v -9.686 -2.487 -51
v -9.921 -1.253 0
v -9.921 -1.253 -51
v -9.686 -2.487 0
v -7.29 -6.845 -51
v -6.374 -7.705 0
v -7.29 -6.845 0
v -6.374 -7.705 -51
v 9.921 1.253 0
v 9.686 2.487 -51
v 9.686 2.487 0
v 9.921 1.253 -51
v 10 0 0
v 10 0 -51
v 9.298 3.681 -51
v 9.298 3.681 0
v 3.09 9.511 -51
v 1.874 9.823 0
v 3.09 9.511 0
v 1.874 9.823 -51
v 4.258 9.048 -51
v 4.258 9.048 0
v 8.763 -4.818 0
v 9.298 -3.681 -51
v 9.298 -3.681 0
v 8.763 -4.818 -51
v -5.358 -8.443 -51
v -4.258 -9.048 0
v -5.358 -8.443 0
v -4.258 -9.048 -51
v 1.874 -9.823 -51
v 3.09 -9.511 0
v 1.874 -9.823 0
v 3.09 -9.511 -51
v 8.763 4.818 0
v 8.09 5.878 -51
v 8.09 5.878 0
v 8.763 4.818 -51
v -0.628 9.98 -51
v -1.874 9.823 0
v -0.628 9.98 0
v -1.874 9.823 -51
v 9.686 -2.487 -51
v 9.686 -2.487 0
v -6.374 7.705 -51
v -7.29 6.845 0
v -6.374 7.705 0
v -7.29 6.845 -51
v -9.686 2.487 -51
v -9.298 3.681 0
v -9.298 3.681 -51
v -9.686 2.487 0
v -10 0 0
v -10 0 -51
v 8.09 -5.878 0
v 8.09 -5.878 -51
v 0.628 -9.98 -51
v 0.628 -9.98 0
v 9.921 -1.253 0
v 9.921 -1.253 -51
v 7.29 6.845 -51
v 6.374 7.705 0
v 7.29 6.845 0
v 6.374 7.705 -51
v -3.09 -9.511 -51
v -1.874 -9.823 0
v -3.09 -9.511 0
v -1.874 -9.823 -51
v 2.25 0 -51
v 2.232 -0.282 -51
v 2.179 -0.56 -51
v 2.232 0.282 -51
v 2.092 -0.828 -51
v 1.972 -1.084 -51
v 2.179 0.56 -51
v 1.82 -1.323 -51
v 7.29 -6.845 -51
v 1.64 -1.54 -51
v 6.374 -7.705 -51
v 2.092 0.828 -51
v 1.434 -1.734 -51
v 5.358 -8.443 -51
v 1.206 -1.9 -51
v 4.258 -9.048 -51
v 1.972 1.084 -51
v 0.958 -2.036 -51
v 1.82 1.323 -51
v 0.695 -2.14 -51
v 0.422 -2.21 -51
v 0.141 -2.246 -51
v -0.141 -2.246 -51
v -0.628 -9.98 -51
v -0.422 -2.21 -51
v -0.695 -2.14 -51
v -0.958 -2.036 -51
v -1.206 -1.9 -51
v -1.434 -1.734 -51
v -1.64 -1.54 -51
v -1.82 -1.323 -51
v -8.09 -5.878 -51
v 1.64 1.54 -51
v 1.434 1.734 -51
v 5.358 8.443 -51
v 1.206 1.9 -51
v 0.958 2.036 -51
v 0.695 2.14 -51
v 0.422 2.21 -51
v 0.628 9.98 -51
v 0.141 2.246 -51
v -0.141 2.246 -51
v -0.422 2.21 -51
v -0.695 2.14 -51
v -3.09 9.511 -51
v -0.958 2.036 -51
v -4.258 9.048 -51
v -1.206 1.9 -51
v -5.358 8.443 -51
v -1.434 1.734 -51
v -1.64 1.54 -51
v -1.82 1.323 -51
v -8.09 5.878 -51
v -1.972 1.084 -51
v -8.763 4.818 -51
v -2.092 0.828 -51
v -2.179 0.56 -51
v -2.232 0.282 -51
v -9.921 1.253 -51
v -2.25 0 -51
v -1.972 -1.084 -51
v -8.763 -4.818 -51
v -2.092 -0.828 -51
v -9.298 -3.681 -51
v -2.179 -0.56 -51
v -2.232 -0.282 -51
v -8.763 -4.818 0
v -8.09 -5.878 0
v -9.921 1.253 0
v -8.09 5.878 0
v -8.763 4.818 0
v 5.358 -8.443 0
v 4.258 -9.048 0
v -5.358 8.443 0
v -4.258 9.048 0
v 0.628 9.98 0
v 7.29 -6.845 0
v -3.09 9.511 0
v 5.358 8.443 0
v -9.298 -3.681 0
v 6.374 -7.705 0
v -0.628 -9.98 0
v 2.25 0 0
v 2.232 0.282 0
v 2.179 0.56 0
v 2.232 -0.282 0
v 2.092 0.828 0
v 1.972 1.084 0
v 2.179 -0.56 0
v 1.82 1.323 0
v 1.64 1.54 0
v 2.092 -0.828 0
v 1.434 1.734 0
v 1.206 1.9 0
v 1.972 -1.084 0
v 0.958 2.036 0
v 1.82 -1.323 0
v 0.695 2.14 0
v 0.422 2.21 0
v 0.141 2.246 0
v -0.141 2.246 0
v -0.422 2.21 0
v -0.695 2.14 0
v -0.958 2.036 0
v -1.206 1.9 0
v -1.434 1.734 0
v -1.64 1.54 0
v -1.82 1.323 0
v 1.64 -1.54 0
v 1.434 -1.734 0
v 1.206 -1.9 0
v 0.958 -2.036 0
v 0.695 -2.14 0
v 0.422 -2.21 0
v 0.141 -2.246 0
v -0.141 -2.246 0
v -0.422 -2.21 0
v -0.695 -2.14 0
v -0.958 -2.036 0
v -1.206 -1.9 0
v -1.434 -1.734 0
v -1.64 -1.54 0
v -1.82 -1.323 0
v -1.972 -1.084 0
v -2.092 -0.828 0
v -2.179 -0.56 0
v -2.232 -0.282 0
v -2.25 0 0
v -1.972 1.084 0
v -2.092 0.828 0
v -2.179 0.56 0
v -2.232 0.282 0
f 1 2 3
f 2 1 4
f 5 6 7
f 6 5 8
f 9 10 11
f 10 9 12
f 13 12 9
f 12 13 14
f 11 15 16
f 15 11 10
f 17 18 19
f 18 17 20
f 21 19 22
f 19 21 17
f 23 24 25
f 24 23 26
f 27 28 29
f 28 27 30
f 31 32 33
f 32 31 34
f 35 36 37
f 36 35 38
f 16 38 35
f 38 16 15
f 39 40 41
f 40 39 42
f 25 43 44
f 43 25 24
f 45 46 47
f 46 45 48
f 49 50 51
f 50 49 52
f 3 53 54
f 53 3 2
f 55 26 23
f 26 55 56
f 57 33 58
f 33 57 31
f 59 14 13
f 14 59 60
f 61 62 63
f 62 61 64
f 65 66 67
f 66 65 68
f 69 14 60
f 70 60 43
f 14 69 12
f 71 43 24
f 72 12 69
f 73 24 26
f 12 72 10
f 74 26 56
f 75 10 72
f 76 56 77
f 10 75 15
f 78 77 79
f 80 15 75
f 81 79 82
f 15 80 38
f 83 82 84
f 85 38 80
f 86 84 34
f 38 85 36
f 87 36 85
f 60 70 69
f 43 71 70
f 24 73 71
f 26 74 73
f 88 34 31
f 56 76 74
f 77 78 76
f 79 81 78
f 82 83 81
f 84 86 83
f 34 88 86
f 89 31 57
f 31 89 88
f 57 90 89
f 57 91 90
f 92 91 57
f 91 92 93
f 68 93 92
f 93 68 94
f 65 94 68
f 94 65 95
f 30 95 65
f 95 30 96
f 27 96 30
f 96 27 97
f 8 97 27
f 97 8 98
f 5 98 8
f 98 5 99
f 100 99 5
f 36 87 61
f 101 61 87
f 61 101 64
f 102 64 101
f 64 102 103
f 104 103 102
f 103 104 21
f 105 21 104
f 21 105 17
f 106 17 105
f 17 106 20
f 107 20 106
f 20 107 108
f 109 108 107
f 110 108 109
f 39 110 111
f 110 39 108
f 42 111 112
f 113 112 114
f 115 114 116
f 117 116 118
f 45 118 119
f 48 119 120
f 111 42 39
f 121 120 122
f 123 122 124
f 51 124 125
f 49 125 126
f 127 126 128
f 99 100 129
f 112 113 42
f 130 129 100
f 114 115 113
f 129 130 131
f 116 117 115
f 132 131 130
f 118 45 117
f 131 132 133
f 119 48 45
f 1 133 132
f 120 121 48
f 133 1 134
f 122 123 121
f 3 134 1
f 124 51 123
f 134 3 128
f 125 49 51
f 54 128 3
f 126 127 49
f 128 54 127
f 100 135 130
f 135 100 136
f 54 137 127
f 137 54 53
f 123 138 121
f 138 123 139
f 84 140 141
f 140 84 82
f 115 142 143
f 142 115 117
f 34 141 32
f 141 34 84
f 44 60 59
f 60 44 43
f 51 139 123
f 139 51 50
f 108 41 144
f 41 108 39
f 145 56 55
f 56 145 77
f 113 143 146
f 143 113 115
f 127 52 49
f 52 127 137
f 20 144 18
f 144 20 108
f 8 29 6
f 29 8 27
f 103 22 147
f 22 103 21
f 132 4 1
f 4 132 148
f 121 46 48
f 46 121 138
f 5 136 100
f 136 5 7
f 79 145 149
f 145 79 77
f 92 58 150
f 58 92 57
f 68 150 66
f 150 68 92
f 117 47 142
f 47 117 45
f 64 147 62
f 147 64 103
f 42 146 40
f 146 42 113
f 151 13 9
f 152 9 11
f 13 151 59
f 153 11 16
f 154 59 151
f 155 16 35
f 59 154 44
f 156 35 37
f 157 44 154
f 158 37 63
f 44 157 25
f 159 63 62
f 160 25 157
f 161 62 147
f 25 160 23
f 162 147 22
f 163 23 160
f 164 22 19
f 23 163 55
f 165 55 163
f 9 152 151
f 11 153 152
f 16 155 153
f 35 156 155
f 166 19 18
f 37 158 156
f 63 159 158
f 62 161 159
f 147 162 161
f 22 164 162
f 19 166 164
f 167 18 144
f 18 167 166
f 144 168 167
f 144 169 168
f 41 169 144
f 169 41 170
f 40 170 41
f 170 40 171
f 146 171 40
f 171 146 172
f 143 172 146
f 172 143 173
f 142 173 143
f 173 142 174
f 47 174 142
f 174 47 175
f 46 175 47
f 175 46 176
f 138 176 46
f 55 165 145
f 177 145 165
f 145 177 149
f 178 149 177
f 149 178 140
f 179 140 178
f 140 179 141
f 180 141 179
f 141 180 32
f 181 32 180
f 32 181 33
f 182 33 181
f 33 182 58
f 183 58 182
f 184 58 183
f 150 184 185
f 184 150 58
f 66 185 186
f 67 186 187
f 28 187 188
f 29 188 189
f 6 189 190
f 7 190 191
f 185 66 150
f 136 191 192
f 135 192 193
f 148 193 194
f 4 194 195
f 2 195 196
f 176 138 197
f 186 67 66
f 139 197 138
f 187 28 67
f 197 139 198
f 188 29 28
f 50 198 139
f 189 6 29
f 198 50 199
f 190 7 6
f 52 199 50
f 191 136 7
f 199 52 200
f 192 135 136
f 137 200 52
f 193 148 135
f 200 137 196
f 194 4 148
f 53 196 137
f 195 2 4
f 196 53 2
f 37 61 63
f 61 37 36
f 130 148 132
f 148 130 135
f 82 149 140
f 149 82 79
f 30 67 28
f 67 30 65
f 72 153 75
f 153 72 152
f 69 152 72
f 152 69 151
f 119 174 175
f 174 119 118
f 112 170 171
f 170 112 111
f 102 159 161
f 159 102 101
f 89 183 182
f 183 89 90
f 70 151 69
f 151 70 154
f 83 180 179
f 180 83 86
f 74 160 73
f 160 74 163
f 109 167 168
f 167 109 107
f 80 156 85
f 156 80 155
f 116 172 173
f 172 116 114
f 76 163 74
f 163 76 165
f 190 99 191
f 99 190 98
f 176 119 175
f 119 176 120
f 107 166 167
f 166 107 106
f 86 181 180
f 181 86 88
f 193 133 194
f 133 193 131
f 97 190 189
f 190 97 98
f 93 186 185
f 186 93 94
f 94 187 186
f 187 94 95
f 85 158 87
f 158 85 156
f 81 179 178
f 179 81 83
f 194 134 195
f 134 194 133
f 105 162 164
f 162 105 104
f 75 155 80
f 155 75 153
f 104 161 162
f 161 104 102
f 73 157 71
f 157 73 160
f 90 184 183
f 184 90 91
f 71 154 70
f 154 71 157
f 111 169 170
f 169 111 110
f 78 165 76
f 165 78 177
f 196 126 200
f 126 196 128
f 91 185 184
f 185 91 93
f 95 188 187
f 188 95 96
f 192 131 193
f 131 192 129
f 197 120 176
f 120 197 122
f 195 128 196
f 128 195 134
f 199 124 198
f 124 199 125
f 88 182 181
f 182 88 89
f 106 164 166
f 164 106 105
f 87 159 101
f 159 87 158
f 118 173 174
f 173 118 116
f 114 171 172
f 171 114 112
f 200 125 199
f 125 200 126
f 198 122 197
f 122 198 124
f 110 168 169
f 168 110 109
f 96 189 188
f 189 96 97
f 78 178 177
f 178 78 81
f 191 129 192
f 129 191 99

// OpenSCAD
$fn = 50;


difference() {
	union() {
		translate(v = [0, 0, -51.0000000000]) {
			cylinder(h = 51, r = 10.0000000000);
		}
	}
	union() {
		#translate(v = [0, 0, -51]) {
			cylinder(h = 51, r = 2.2500000000);
		}
	}
}
